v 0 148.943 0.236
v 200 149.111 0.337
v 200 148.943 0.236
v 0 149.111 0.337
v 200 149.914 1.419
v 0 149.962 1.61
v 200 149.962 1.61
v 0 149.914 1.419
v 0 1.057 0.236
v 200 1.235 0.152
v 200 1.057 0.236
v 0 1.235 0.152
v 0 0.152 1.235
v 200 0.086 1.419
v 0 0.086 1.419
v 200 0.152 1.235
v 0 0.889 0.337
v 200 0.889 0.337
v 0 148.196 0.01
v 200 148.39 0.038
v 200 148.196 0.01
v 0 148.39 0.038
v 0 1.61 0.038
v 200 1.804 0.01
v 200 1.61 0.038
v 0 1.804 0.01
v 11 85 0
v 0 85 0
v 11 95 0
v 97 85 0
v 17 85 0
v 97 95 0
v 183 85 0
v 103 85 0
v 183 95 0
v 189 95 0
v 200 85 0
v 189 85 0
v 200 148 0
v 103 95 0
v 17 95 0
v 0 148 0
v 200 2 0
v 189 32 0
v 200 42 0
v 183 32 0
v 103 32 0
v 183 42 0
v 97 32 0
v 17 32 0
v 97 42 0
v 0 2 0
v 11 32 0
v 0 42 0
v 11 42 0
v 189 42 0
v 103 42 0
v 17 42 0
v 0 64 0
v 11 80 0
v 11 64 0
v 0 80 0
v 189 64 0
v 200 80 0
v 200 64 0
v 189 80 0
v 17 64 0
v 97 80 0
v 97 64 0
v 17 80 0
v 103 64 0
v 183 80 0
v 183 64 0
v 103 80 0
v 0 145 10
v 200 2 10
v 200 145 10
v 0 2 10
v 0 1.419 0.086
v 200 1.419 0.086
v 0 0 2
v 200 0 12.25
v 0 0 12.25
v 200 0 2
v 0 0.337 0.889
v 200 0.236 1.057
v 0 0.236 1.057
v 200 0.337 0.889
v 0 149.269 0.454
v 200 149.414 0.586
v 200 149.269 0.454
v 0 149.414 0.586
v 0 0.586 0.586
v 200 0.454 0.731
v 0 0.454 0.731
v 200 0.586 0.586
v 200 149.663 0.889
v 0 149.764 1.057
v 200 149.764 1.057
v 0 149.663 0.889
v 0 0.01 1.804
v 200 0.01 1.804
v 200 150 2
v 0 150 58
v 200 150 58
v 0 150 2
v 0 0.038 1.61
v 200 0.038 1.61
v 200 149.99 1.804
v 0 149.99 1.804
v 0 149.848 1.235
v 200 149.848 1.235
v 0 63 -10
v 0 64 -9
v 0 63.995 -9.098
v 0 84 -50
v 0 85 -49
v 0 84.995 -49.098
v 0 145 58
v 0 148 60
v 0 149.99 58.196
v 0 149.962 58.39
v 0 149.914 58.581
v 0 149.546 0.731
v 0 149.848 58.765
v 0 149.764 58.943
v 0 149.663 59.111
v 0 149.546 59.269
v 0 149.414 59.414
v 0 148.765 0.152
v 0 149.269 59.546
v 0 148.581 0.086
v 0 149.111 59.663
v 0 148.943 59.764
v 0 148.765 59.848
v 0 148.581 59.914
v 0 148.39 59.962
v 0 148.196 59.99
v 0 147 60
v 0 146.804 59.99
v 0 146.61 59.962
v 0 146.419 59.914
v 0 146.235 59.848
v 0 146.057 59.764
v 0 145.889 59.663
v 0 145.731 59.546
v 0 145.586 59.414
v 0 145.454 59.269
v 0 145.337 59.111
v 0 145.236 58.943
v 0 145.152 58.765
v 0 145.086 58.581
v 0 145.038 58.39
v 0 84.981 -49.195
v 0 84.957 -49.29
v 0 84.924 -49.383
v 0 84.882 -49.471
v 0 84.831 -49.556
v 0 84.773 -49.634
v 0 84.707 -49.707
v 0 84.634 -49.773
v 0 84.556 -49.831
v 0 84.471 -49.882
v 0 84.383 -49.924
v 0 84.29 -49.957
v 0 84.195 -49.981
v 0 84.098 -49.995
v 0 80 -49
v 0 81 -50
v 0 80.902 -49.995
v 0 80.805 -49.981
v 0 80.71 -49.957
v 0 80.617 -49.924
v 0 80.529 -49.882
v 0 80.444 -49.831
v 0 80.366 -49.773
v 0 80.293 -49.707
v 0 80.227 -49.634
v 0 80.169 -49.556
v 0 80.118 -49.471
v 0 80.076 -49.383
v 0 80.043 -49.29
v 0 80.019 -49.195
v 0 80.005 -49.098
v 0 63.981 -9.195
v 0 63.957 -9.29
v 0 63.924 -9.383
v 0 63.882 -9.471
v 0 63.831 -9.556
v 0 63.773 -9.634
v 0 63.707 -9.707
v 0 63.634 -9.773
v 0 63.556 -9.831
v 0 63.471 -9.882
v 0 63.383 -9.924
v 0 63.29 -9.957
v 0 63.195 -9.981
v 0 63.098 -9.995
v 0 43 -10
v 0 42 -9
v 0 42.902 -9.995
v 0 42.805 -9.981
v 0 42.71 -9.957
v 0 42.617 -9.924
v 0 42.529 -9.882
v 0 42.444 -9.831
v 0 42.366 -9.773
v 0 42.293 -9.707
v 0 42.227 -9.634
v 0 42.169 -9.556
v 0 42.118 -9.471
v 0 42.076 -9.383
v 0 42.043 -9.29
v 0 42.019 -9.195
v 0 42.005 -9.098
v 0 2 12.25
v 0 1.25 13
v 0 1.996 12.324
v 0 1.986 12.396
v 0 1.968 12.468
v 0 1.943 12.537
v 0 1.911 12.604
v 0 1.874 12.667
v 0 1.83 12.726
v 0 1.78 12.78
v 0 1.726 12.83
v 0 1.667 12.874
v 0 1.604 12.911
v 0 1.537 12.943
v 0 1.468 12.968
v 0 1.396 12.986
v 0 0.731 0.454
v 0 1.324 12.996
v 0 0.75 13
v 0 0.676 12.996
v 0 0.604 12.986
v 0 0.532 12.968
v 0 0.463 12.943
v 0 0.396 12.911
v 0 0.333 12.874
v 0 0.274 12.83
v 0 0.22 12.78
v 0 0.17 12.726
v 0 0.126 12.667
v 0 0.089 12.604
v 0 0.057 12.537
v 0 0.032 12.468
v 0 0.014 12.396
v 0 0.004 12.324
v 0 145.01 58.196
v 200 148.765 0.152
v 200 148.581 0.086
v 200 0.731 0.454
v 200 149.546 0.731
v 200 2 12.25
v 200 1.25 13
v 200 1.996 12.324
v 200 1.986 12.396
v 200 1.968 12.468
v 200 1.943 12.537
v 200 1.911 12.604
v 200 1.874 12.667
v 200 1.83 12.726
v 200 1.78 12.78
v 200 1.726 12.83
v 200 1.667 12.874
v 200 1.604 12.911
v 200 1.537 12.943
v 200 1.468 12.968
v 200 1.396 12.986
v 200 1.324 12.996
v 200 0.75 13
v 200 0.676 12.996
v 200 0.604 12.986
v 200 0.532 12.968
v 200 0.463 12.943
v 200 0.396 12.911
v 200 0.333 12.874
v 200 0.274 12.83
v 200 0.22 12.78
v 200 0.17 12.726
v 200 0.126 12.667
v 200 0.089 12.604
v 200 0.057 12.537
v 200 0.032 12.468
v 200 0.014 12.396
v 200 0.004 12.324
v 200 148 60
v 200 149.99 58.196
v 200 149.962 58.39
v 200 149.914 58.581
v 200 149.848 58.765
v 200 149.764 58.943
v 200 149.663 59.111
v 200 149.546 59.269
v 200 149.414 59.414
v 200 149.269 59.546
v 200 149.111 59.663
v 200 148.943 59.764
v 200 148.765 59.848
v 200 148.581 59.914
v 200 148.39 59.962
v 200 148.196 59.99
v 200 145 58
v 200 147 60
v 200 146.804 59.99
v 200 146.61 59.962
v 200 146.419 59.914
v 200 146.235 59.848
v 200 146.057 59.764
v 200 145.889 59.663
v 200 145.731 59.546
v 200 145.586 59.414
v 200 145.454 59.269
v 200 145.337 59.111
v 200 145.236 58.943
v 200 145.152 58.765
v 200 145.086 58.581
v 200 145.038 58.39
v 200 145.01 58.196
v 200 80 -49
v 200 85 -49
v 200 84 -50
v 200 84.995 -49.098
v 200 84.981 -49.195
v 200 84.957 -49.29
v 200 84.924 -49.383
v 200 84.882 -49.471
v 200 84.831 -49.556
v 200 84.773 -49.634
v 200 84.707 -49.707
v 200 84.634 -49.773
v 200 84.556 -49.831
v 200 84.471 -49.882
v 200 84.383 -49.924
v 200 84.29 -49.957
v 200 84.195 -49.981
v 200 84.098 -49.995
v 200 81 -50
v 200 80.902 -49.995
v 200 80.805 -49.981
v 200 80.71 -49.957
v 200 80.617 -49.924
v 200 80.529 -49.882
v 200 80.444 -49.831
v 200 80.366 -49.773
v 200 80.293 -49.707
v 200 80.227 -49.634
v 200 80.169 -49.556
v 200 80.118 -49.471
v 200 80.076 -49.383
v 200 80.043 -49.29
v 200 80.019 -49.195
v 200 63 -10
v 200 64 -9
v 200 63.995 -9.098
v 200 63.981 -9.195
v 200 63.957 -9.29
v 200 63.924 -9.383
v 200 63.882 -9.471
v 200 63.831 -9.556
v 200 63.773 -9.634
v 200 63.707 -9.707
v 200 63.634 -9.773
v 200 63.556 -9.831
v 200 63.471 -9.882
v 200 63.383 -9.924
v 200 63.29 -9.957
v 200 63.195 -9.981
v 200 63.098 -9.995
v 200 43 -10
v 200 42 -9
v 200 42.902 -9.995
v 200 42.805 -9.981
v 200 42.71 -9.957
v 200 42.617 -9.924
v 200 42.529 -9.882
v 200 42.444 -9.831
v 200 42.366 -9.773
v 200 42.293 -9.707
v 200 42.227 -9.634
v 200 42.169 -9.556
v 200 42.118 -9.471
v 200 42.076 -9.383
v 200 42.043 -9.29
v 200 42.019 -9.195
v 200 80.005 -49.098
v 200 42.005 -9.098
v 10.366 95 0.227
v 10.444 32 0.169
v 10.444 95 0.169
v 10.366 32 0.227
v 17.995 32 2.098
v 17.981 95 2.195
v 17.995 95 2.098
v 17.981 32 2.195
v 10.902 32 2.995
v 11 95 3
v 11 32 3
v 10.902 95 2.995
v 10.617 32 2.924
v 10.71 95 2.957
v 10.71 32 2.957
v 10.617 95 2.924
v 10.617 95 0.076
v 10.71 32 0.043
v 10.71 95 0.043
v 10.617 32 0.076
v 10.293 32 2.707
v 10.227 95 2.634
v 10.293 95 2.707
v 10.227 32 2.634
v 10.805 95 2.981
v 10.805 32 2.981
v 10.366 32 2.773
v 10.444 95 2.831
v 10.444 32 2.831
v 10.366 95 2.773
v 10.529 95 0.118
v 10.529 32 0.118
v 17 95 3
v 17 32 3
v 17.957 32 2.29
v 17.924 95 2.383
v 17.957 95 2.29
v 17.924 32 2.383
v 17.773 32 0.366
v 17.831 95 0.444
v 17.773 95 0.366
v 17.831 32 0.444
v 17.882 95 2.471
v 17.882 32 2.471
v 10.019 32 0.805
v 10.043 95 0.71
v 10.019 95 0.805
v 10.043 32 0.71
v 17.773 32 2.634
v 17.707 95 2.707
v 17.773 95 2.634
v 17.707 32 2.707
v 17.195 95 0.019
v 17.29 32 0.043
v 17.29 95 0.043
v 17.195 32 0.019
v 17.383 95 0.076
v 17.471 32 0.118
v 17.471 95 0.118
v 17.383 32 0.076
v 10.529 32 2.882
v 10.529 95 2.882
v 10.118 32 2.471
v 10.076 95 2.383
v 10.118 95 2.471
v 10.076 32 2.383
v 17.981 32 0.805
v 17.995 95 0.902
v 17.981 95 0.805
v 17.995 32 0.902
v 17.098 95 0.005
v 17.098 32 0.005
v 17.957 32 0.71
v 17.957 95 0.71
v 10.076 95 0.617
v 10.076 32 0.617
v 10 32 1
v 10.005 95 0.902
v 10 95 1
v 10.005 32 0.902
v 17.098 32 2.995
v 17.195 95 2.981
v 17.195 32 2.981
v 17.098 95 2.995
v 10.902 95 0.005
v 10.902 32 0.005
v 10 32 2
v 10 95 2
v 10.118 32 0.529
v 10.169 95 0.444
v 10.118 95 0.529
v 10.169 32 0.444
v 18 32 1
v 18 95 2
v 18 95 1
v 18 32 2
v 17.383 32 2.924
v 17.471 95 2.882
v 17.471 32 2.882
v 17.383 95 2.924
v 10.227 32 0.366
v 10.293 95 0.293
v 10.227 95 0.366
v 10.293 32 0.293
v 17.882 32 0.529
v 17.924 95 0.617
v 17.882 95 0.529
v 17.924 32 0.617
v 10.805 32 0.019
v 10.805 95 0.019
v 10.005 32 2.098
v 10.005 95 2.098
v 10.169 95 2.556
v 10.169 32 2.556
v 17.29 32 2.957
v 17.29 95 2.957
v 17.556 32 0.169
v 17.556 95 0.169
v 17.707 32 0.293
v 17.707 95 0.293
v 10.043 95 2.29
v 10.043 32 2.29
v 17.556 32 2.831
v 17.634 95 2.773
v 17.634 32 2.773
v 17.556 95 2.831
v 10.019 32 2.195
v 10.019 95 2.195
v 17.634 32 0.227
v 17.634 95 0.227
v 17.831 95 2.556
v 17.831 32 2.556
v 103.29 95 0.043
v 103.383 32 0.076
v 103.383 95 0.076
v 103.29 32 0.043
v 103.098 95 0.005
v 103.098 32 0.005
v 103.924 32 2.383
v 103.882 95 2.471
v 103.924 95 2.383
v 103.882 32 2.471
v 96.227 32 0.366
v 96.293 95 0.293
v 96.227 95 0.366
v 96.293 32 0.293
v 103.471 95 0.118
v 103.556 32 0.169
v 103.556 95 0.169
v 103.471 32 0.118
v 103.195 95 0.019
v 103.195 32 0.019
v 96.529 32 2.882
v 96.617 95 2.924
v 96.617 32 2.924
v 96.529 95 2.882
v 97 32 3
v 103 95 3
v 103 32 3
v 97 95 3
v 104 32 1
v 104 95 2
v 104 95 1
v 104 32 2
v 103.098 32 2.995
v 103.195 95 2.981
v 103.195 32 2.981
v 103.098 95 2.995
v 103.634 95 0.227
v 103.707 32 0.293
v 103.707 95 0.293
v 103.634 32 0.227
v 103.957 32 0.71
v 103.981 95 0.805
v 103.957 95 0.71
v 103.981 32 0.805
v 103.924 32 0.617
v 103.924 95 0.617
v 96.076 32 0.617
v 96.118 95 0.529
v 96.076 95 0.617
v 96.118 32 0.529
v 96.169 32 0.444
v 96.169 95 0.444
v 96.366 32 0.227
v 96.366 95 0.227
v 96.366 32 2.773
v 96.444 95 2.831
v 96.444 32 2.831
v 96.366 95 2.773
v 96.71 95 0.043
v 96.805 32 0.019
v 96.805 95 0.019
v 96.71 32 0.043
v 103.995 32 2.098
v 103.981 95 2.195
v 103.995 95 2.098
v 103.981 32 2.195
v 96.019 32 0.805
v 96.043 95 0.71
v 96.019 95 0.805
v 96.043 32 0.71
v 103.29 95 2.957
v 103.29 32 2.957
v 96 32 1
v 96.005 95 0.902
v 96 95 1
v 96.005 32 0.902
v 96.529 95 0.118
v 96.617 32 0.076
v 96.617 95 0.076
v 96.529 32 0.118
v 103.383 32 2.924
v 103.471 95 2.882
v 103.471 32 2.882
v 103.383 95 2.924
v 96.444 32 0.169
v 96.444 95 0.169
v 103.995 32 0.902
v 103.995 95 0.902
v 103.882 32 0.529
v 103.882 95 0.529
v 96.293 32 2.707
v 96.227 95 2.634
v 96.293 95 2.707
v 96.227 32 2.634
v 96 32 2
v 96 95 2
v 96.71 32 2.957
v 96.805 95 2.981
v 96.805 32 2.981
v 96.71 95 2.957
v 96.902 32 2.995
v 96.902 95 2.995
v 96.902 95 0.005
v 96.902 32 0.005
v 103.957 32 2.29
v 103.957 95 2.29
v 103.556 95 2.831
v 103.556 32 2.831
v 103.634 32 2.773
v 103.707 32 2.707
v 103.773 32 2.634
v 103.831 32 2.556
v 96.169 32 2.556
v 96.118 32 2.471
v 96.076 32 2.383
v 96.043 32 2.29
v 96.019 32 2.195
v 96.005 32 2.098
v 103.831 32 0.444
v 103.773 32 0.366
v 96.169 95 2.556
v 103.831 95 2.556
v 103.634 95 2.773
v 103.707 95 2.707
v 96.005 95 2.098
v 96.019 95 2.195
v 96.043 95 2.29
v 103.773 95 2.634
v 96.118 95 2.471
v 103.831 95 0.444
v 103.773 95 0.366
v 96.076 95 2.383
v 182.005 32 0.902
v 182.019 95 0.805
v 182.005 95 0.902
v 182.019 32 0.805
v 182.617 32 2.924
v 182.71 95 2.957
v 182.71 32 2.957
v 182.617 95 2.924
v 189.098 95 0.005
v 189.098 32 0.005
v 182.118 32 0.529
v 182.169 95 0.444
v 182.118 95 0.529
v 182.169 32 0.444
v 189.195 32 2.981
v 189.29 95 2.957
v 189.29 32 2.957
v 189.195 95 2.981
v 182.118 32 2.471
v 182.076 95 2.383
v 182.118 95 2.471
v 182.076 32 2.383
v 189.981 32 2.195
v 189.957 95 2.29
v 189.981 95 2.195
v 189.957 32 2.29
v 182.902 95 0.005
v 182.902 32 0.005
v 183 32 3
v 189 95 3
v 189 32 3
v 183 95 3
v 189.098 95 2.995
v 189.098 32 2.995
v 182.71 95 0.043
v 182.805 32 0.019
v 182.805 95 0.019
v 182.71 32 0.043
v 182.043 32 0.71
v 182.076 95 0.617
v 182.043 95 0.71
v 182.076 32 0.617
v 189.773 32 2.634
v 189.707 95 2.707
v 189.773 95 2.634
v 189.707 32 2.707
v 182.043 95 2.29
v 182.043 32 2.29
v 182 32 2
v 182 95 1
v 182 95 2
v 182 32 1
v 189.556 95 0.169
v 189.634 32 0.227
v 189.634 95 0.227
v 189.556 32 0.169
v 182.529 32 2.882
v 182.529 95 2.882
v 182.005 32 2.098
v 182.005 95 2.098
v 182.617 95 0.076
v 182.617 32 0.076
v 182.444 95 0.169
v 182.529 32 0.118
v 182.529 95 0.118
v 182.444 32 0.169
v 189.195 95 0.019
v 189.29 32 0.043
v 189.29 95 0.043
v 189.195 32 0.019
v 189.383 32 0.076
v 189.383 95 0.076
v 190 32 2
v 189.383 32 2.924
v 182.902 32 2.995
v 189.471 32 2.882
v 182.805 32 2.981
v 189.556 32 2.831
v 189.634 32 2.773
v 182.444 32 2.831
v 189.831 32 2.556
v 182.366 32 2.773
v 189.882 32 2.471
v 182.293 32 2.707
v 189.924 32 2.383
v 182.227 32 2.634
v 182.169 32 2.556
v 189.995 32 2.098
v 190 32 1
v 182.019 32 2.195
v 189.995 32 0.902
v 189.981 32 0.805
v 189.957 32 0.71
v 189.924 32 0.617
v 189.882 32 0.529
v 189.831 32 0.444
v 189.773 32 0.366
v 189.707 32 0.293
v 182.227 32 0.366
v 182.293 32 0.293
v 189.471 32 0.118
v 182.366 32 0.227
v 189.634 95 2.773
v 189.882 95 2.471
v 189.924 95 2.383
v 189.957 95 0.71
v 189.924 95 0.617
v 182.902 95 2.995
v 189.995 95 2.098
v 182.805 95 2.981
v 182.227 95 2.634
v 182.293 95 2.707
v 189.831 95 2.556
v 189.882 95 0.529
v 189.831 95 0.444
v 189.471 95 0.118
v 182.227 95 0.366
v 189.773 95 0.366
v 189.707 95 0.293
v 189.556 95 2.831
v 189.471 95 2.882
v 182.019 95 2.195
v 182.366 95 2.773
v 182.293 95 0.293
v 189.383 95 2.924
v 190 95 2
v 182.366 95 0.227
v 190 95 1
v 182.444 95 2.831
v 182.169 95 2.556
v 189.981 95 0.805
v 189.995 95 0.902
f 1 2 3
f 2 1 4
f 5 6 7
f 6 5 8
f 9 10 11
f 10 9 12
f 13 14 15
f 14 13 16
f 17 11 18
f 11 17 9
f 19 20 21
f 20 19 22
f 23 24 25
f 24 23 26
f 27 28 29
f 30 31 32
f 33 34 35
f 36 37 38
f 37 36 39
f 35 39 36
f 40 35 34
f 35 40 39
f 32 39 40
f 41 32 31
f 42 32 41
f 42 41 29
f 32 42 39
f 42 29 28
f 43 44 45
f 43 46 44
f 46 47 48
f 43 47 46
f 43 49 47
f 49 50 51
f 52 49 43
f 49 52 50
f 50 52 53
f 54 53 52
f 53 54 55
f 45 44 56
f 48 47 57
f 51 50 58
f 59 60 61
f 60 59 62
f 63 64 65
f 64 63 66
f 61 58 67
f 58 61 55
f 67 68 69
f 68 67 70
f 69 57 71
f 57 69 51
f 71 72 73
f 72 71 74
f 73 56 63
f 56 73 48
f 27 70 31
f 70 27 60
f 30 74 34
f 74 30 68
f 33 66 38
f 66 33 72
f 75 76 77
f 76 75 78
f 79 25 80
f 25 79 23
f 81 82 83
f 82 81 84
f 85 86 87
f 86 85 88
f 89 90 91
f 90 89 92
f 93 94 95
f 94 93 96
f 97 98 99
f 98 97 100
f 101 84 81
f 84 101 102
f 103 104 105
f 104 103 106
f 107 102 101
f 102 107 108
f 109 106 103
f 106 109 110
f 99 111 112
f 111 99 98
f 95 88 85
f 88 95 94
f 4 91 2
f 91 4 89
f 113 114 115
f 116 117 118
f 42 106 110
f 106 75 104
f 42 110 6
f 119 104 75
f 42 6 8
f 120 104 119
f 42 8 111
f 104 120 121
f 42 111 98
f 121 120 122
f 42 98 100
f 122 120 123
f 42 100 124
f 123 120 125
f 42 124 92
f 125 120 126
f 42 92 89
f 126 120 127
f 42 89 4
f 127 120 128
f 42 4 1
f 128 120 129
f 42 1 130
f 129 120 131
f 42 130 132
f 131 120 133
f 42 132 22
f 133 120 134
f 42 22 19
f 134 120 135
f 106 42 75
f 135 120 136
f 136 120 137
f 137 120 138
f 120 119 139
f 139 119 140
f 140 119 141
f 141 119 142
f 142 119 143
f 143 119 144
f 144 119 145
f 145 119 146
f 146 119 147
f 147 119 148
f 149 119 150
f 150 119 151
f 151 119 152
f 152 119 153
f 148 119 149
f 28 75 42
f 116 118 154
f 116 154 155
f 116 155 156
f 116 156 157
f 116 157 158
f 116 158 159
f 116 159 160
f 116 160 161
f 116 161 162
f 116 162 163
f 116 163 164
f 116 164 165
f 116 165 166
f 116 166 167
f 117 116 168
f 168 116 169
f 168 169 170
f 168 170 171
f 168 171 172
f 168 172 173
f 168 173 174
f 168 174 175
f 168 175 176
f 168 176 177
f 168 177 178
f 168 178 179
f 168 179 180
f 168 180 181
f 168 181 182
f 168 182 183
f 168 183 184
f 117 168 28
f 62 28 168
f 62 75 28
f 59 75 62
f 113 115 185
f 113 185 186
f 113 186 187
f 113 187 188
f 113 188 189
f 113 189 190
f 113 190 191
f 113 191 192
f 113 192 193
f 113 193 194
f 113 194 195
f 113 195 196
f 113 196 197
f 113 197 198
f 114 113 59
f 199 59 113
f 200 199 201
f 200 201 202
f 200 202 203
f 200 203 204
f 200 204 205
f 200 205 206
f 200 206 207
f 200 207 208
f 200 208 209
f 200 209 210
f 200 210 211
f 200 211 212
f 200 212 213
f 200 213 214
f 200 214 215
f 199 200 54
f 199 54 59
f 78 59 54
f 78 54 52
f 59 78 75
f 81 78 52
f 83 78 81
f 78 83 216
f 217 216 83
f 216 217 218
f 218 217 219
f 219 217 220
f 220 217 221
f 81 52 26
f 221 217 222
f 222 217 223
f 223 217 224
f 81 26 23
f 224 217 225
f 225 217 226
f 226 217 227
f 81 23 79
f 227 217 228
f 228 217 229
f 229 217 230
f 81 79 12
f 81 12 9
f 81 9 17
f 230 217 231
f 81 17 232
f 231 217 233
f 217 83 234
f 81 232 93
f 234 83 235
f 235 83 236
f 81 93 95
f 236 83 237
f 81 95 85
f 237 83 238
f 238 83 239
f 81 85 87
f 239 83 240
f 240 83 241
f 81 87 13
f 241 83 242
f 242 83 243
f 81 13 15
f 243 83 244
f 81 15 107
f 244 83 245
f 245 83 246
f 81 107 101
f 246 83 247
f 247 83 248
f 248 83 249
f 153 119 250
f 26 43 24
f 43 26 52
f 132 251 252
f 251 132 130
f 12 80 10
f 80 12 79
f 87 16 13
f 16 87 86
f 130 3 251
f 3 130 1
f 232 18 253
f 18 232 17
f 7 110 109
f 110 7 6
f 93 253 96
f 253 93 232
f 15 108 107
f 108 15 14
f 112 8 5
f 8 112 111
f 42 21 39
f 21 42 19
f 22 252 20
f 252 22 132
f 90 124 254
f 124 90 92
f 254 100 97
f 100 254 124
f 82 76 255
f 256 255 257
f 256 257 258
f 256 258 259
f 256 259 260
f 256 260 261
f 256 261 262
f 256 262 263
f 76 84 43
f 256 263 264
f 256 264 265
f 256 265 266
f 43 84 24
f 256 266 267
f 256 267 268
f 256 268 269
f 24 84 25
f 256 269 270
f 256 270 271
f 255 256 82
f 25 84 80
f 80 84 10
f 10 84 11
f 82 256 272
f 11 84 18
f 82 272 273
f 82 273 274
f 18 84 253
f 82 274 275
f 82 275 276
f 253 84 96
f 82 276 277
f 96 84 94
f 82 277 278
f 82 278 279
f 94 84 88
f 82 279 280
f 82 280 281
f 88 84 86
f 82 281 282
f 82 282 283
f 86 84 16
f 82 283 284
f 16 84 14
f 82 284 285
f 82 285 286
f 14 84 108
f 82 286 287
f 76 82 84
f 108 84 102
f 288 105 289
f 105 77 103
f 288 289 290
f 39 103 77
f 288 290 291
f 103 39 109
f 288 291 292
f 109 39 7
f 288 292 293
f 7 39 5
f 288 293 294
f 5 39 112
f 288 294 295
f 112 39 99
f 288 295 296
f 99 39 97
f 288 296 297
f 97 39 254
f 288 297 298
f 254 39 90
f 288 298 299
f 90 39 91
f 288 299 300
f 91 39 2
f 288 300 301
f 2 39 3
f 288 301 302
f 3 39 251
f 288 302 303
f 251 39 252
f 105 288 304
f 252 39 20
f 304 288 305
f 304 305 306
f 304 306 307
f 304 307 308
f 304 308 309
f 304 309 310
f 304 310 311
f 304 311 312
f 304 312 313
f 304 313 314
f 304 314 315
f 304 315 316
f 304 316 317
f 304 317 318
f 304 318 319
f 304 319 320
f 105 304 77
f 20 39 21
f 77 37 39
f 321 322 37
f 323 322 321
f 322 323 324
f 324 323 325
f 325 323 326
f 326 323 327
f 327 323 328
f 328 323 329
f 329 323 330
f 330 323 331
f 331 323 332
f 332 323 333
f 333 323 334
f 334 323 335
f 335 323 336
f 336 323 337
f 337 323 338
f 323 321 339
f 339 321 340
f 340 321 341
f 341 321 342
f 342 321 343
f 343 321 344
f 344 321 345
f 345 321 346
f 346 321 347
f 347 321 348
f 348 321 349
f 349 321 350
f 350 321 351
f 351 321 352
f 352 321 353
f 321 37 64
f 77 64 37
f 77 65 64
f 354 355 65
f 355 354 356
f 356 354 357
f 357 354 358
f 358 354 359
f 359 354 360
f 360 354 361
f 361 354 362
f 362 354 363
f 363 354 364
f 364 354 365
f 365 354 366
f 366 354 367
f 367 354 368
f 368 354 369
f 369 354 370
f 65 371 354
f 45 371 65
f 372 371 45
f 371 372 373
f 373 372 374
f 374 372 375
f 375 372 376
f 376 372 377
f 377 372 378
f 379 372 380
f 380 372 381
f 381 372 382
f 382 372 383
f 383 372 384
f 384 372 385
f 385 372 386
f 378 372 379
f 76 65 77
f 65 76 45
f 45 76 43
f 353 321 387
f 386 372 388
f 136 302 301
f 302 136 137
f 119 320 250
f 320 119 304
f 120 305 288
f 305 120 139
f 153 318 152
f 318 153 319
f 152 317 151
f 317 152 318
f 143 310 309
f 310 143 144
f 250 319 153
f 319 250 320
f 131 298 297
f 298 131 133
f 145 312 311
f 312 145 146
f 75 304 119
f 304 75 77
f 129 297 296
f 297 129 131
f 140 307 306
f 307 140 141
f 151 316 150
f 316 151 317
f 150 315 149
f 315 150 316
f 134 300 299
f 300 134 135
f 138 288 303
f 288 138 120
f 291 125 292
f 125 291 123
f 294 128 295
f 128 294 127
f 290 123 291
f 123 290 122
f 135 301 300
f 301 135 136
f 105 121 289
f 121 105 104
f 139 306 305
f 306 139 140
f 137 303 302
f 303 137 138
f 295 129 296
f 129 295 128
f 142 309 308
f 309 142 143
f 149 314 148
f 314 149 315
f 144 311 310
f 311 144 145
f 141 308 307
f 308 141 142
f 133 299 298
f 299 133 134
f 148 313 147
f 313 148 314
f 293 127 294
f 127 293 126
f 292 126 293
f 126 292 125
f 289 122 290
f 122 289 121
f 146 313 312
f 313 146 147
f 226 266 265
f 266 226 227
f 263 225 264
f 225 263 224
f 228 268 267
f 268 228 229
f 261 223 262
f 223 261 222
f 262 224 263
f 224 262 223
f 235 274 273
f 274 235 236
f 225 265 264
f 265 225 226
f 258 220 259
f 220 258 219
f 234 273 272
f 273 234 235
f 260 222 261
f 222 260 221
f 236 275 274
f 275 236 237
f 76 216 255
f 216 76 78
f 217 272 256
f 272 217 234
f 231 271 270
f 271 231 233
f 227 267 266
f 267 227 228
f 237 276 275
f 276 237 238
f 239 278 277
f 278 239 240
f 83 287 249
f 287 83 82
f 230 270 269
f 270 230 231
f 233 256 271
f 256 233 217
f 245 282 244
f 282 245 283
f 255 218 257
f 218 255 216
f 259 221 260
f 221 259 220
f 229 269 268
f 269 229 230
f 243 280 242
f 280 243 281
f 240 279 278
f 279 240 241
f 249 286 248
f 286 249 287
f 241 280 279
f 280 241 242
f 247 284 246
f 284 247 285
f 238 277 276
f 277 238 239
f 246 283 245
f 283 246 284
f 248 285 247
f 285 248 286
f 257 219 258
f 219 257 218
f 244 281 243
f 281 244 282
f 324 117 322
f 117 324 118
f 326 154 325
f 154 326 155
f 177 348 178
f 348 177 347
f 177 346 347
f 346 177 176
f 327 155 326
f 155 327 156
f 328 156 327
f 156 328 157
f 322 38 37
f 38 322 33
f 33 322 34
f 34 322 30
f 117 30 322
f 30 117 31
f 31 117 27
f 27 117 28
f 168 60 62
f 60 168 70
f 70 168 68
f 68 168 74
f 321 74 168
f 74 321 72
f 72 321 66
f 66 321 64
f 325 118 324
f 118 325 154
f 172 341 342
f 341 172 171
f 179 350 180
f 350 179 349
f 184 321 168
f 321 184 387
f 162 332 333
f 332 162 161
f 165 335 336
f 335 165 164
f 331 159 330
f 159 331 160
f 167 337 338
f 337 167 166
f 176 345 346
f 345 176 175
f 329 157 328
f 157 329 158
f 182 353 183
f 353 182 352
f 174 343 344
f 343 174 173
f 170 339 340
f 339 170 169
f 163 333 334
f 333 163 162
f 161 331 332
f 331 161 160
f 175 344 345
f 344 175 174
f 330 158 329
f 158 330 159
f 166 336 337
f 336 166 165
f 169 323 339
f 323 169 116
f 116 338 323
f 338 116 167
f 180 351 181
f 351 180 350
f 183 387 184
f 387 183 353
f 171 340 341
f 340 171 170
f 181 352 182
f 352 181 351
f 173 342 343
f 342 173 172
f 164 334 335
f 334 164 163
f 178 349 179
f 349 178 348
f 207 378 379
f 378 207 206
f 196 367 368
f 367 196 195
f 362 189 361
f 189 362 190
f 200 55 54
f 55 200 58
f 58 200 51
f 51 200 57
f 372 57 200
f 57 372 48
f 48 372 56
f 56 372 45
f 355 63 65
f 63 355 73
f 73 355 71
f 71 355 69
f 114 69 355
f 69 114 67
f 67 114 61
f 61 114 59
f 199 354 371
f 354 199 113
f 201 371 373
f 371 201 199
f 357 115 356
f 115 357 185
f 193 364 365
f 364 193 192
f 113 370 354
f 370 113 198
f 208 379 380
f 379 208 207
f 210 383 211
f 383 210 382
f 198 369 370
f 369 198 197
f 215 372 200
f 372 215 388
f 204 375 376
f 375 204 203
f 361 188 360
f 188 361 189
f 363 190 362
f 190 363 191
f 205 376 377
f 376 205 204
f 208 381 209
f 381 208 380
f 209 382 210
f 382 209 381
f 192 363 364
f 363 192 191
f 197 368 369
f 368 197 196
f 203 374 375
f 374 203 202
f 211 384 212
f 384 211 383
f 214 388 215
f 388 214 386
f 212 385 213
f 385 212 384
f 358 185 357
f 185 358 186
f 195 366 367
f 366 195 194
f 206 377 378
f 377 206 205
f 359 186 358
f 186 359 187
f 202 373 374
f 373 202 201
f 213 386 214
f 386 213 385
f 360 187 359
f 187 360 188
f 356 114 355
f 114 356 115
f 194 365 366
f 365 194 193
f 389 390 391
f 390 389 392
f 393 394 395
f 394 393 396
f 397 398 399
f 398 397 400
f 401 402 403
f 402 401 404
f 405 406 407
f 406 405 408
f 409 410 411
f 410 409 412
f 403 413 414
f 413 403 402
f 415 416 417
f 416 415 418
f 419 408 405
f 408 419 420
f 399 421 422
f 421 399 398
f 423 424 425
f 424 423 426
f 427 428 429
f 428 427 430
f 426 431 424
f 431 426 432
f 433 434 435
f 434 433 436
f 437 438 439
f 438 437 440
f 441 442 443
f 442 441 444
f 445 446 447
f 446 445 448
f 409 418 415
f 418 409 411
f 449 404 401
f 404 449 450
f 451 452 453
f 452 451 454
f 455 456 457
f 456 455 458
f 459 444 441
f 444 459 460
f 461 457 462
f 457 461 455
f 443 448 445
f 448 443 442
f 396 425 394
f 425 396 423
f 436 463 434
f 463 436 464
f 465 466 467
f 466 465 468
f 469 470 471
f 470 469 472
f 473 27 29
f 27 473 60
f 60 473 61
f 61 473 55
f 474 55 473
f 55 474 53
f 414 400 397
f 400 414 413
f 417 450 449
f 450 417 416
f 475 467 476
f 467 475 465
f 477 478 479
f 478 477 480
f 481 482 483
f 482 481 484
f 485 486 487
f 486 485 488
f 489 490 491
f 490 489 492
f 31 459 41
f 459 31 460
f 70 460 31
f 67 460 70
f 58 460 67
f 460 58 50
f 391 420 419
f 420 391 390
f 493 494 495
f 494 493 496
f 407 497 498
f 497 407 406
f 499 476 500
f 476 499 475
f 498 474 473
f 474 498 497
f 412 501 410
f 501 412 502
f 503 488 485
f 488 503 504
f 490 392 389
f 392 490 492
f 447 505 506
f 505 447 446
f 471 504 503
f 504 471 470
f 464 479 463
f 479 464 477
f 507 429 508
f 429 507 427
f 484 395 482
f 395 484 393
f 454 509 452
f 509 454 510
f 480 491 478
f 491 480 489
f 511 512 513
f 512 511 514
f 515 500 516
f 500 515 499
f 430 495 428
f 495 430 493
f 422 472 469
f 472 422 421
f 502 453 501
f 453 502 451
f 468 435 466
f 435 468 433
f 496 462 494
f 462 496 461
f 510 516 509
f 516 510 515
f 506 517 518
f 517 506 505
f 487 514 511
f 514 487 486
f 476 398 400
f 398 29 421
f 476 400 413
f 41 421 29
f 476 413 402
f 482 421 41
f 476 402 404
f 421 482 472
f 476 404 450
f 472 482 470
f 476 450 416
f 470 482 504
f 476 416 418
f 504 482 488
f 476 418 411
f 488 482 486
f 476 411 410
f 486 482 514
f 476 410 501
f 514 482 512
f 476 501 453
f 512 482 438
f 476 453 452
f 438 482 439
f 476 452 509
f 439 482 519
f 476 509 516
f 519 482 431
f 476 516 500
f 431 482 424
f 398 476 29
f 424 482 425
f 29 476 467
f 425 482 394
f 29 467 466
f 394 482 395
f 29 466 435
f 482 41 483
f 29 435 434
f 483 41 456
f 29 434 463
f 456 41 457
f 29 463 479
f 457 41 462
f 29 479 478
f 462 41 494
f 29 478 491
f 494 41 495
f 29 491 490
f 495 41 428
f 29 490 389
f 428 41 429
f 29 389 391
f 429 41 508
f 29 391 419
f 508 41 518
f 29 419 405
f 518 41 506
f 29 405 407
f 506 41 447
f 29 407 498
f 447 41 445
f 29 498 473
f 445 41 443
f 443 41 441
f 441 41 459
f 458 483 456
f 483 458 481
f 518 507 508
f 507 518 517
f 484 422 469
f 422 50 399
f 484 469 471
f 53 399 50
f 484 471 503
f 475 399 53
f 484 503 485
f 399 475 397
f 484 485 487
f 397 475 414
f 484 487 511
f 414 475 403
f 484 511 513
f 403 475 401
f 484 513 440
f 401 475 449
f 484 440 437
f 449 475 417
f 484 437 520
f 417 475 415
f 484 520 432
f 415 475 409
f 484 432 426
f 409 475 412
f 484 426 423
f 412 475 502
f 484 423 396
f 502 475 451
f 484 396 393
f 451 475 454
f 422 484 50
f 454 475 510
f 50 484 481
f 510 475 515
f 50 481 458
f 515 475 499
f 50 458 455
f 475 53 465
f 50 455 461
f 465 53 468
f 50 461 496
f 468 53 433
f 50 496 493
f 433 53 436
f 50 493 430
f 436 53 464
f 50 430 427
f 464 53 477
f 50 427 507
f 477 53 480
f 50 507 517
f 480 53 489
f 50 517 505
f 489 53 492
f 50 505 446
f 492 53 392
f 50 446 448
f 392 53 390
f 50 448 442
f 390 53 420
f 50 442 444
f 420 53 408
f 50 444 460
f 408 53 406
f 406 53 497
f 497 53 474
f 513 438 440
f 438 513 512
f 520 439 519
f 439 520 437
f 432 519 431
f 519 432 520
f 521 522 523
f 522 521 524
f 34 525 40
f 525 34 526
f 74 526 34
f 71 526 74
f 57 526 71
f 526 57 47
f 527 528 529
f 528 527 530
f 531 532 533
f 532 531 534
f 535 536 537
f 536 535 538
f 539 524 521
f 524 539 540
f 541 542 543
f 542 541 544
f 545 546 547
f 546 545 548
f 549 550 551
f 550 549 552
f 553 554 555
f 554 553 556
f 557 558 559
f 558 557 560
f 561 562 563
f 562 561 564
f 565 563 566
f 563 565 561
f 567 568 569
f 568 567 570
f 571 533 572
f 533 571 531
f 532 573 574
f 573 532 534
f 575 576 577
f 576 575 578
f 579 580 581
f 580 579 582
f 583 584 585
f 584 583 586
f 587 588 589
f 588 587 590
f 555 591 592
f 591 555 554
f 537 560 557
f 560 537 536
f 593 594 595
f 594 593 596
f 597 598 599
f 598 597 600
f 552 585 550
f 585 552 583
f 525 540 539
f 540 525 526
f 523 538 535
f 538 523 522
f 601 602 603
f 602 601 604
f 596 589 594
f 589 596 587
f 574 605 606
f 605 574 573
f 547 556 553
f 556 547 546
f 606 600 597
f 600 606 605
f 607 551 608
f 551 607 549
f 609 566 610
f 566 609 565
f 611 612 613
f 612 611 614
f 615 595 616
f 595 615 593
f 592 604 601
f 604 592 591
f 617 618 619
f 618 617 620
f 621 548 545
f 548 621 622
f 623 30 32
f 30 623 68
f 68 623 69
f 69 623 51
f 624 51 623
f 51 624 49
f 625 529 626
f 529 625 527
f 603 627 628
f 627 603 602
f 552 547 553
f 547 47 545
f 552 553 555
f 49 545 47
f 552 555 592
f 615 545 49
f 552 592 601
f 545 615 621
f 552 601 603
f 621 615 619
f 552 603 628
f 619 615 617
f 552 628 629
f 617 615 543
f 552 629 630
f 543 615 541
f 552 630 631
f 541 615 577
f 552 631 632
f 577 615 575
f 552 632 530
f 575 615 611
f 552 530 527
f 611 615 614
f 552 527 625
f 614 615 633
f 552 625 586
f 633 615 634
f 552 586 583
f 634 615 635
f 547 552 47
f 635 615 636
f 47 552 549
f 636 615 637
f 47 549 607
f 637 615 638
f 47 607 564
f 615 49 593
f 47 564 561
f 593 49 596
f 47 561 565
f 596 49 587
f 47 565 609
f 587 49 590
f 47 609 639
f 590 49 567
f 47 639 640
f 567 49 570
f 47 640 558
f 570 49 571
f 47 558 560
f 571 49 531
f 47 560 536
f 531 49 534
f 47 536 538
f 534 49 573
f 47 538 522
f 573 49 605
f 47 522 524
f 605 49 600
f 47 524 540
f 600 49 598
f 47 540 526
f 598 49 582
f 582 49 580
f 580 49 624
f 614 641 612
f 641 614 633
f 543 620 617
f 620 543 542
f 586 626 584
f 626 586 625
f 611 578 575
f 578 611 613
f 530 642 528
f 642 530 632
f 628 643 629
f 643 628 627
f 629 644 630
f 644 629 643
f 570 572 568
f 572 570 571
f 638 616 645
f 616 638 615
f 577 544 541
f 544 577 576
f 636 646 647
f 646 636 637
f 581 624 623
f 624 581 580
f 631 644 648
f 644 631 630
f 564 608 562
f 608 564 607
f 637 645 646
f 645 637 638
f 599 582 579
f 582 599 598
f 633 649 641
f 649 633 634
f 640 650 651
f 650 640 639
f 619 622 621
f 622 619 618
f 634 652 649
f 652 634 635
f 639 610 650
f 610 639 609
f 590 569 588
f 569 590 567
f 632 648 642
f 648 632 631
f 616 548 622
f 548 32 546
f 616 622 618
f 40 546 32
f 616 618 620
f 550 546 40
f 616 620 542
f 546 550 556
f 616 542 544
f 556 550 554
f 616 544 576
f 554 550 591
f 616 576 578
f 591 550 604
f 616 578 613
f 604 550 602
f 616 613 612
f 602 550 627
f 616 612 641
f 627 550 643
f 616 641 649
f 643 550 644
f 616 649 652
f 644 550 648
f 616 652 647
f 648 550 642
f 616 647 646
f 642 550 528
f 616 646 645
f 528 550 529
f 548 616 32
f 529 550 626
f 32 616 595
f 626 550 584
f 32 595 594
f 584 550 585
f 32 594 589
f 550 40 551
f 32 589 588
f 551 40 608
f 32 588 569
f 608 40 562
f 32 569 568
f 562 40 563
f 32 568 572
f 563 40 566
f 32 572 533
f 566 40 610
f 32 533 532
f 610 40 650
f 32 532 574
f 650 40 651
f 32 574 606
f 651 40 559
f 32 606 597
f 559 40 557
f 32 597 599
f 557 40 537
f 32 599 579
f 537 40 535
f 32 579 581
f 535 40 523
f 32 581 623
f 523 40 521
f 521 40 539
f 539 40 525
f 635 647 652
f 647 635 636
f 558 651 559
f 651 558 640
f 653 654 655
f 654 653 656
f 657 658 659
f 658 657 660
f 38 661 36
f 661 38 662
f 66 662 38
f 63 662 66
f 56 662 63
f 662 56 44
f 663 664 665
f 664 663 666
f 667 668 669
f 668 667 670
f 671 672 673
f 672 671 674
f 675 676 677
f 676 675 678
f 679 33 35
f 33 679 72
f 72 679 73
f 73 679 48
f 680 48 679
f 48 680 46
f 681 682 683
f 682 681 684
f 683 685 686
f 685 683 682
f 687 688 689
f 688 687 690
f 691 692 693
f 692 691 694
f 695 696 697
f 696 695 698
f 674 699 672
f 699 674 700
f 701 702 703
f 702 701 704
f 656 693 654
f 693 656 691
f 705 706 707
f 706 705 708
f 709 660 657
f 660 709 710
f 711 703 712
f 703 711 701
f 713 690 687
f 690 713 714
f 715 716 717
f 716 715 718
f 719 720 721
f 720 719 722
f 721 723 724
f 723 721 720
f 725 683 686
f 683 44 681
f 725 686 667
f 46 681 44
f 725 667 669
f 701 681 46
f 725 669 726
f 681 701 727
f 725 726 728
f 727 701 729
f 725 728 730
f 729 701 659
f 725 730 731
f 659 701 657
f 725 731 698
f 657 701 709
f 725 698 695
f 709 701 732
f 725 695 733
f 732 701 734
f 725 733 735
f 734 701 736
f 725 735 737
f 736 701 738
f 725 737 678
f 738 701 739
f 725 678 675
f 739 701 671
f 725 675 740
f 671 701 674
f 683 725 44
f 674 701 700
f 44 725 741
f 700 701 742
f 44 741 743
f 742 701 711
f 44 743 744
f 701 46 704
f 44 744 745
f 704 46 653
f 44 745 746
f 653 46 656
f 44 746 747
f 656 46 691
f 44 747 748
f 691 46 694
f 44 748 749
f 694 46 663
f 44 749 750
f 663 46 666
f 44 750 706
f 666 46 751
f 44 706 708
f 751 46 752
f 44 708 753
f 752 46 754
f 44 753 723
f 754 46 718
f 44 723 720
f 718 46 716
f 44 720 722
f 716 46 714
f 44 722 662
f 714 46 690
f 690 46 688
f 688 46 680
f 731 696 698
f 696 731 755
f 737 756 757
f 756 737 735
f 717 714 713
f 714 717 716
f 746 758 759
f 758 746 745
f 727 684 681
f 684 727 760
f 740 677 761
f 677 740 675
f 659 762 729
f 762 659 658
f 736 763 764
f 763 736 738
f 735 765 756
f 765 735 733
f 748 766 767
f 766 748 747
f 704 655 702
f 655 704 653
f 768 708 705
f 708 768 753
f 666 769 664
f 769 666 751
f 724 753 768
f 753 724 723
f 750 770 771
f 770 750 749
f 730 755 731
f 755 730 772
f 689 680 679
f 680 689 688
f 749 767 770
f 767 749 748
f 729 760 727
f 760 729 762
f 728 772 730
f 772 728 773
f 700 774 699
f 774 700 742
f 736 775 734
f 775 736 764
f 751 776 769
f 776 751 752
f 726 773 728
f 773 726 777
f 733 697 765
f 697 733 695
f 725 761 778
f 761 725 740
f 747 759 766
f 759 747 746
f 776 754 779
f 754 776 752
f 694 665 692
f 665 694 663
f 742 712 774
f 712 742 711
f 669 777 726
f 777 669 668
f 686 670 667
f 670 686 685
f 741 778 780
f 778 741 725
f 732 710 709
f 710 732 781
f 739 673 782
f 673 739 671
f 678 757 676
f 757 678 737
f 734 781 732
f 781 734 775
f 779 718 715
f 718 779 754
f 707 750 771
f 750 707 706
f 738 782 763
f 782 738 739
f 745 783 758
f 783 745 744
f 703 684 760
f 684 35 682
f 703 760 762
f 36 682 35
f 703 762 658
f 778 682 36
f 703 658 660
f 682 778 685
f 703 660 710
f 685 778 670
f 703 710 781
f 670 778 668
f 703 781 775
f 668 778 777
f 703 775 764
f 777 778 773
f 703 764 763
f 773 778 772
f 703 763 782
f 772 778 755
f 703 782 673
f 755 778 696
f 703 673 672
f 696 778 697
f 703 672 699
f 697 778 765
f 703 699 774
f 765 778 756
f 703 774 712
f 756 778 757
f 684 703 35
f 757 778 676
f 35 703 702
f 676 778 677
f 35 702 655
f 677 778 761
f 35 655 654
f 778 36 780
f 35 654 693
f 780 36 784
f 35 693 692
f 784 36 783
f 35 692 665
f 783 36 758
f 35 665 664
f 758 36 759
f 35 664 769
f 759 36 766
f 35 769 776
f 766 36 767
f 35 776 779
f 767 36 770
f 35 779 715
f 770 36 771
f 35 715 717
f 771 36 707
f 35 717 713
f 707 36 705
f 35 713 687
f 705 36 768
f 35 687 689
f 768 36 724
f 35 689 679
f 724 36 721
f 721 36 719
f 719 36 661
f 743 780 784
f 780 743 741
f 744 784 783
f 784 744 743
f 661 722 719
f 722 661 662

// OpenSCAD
// 200mm-wide bar shelf — see bar_shelf.scad for the design.
shelf_width_override = 200;
include <bar_shelf.scad>
